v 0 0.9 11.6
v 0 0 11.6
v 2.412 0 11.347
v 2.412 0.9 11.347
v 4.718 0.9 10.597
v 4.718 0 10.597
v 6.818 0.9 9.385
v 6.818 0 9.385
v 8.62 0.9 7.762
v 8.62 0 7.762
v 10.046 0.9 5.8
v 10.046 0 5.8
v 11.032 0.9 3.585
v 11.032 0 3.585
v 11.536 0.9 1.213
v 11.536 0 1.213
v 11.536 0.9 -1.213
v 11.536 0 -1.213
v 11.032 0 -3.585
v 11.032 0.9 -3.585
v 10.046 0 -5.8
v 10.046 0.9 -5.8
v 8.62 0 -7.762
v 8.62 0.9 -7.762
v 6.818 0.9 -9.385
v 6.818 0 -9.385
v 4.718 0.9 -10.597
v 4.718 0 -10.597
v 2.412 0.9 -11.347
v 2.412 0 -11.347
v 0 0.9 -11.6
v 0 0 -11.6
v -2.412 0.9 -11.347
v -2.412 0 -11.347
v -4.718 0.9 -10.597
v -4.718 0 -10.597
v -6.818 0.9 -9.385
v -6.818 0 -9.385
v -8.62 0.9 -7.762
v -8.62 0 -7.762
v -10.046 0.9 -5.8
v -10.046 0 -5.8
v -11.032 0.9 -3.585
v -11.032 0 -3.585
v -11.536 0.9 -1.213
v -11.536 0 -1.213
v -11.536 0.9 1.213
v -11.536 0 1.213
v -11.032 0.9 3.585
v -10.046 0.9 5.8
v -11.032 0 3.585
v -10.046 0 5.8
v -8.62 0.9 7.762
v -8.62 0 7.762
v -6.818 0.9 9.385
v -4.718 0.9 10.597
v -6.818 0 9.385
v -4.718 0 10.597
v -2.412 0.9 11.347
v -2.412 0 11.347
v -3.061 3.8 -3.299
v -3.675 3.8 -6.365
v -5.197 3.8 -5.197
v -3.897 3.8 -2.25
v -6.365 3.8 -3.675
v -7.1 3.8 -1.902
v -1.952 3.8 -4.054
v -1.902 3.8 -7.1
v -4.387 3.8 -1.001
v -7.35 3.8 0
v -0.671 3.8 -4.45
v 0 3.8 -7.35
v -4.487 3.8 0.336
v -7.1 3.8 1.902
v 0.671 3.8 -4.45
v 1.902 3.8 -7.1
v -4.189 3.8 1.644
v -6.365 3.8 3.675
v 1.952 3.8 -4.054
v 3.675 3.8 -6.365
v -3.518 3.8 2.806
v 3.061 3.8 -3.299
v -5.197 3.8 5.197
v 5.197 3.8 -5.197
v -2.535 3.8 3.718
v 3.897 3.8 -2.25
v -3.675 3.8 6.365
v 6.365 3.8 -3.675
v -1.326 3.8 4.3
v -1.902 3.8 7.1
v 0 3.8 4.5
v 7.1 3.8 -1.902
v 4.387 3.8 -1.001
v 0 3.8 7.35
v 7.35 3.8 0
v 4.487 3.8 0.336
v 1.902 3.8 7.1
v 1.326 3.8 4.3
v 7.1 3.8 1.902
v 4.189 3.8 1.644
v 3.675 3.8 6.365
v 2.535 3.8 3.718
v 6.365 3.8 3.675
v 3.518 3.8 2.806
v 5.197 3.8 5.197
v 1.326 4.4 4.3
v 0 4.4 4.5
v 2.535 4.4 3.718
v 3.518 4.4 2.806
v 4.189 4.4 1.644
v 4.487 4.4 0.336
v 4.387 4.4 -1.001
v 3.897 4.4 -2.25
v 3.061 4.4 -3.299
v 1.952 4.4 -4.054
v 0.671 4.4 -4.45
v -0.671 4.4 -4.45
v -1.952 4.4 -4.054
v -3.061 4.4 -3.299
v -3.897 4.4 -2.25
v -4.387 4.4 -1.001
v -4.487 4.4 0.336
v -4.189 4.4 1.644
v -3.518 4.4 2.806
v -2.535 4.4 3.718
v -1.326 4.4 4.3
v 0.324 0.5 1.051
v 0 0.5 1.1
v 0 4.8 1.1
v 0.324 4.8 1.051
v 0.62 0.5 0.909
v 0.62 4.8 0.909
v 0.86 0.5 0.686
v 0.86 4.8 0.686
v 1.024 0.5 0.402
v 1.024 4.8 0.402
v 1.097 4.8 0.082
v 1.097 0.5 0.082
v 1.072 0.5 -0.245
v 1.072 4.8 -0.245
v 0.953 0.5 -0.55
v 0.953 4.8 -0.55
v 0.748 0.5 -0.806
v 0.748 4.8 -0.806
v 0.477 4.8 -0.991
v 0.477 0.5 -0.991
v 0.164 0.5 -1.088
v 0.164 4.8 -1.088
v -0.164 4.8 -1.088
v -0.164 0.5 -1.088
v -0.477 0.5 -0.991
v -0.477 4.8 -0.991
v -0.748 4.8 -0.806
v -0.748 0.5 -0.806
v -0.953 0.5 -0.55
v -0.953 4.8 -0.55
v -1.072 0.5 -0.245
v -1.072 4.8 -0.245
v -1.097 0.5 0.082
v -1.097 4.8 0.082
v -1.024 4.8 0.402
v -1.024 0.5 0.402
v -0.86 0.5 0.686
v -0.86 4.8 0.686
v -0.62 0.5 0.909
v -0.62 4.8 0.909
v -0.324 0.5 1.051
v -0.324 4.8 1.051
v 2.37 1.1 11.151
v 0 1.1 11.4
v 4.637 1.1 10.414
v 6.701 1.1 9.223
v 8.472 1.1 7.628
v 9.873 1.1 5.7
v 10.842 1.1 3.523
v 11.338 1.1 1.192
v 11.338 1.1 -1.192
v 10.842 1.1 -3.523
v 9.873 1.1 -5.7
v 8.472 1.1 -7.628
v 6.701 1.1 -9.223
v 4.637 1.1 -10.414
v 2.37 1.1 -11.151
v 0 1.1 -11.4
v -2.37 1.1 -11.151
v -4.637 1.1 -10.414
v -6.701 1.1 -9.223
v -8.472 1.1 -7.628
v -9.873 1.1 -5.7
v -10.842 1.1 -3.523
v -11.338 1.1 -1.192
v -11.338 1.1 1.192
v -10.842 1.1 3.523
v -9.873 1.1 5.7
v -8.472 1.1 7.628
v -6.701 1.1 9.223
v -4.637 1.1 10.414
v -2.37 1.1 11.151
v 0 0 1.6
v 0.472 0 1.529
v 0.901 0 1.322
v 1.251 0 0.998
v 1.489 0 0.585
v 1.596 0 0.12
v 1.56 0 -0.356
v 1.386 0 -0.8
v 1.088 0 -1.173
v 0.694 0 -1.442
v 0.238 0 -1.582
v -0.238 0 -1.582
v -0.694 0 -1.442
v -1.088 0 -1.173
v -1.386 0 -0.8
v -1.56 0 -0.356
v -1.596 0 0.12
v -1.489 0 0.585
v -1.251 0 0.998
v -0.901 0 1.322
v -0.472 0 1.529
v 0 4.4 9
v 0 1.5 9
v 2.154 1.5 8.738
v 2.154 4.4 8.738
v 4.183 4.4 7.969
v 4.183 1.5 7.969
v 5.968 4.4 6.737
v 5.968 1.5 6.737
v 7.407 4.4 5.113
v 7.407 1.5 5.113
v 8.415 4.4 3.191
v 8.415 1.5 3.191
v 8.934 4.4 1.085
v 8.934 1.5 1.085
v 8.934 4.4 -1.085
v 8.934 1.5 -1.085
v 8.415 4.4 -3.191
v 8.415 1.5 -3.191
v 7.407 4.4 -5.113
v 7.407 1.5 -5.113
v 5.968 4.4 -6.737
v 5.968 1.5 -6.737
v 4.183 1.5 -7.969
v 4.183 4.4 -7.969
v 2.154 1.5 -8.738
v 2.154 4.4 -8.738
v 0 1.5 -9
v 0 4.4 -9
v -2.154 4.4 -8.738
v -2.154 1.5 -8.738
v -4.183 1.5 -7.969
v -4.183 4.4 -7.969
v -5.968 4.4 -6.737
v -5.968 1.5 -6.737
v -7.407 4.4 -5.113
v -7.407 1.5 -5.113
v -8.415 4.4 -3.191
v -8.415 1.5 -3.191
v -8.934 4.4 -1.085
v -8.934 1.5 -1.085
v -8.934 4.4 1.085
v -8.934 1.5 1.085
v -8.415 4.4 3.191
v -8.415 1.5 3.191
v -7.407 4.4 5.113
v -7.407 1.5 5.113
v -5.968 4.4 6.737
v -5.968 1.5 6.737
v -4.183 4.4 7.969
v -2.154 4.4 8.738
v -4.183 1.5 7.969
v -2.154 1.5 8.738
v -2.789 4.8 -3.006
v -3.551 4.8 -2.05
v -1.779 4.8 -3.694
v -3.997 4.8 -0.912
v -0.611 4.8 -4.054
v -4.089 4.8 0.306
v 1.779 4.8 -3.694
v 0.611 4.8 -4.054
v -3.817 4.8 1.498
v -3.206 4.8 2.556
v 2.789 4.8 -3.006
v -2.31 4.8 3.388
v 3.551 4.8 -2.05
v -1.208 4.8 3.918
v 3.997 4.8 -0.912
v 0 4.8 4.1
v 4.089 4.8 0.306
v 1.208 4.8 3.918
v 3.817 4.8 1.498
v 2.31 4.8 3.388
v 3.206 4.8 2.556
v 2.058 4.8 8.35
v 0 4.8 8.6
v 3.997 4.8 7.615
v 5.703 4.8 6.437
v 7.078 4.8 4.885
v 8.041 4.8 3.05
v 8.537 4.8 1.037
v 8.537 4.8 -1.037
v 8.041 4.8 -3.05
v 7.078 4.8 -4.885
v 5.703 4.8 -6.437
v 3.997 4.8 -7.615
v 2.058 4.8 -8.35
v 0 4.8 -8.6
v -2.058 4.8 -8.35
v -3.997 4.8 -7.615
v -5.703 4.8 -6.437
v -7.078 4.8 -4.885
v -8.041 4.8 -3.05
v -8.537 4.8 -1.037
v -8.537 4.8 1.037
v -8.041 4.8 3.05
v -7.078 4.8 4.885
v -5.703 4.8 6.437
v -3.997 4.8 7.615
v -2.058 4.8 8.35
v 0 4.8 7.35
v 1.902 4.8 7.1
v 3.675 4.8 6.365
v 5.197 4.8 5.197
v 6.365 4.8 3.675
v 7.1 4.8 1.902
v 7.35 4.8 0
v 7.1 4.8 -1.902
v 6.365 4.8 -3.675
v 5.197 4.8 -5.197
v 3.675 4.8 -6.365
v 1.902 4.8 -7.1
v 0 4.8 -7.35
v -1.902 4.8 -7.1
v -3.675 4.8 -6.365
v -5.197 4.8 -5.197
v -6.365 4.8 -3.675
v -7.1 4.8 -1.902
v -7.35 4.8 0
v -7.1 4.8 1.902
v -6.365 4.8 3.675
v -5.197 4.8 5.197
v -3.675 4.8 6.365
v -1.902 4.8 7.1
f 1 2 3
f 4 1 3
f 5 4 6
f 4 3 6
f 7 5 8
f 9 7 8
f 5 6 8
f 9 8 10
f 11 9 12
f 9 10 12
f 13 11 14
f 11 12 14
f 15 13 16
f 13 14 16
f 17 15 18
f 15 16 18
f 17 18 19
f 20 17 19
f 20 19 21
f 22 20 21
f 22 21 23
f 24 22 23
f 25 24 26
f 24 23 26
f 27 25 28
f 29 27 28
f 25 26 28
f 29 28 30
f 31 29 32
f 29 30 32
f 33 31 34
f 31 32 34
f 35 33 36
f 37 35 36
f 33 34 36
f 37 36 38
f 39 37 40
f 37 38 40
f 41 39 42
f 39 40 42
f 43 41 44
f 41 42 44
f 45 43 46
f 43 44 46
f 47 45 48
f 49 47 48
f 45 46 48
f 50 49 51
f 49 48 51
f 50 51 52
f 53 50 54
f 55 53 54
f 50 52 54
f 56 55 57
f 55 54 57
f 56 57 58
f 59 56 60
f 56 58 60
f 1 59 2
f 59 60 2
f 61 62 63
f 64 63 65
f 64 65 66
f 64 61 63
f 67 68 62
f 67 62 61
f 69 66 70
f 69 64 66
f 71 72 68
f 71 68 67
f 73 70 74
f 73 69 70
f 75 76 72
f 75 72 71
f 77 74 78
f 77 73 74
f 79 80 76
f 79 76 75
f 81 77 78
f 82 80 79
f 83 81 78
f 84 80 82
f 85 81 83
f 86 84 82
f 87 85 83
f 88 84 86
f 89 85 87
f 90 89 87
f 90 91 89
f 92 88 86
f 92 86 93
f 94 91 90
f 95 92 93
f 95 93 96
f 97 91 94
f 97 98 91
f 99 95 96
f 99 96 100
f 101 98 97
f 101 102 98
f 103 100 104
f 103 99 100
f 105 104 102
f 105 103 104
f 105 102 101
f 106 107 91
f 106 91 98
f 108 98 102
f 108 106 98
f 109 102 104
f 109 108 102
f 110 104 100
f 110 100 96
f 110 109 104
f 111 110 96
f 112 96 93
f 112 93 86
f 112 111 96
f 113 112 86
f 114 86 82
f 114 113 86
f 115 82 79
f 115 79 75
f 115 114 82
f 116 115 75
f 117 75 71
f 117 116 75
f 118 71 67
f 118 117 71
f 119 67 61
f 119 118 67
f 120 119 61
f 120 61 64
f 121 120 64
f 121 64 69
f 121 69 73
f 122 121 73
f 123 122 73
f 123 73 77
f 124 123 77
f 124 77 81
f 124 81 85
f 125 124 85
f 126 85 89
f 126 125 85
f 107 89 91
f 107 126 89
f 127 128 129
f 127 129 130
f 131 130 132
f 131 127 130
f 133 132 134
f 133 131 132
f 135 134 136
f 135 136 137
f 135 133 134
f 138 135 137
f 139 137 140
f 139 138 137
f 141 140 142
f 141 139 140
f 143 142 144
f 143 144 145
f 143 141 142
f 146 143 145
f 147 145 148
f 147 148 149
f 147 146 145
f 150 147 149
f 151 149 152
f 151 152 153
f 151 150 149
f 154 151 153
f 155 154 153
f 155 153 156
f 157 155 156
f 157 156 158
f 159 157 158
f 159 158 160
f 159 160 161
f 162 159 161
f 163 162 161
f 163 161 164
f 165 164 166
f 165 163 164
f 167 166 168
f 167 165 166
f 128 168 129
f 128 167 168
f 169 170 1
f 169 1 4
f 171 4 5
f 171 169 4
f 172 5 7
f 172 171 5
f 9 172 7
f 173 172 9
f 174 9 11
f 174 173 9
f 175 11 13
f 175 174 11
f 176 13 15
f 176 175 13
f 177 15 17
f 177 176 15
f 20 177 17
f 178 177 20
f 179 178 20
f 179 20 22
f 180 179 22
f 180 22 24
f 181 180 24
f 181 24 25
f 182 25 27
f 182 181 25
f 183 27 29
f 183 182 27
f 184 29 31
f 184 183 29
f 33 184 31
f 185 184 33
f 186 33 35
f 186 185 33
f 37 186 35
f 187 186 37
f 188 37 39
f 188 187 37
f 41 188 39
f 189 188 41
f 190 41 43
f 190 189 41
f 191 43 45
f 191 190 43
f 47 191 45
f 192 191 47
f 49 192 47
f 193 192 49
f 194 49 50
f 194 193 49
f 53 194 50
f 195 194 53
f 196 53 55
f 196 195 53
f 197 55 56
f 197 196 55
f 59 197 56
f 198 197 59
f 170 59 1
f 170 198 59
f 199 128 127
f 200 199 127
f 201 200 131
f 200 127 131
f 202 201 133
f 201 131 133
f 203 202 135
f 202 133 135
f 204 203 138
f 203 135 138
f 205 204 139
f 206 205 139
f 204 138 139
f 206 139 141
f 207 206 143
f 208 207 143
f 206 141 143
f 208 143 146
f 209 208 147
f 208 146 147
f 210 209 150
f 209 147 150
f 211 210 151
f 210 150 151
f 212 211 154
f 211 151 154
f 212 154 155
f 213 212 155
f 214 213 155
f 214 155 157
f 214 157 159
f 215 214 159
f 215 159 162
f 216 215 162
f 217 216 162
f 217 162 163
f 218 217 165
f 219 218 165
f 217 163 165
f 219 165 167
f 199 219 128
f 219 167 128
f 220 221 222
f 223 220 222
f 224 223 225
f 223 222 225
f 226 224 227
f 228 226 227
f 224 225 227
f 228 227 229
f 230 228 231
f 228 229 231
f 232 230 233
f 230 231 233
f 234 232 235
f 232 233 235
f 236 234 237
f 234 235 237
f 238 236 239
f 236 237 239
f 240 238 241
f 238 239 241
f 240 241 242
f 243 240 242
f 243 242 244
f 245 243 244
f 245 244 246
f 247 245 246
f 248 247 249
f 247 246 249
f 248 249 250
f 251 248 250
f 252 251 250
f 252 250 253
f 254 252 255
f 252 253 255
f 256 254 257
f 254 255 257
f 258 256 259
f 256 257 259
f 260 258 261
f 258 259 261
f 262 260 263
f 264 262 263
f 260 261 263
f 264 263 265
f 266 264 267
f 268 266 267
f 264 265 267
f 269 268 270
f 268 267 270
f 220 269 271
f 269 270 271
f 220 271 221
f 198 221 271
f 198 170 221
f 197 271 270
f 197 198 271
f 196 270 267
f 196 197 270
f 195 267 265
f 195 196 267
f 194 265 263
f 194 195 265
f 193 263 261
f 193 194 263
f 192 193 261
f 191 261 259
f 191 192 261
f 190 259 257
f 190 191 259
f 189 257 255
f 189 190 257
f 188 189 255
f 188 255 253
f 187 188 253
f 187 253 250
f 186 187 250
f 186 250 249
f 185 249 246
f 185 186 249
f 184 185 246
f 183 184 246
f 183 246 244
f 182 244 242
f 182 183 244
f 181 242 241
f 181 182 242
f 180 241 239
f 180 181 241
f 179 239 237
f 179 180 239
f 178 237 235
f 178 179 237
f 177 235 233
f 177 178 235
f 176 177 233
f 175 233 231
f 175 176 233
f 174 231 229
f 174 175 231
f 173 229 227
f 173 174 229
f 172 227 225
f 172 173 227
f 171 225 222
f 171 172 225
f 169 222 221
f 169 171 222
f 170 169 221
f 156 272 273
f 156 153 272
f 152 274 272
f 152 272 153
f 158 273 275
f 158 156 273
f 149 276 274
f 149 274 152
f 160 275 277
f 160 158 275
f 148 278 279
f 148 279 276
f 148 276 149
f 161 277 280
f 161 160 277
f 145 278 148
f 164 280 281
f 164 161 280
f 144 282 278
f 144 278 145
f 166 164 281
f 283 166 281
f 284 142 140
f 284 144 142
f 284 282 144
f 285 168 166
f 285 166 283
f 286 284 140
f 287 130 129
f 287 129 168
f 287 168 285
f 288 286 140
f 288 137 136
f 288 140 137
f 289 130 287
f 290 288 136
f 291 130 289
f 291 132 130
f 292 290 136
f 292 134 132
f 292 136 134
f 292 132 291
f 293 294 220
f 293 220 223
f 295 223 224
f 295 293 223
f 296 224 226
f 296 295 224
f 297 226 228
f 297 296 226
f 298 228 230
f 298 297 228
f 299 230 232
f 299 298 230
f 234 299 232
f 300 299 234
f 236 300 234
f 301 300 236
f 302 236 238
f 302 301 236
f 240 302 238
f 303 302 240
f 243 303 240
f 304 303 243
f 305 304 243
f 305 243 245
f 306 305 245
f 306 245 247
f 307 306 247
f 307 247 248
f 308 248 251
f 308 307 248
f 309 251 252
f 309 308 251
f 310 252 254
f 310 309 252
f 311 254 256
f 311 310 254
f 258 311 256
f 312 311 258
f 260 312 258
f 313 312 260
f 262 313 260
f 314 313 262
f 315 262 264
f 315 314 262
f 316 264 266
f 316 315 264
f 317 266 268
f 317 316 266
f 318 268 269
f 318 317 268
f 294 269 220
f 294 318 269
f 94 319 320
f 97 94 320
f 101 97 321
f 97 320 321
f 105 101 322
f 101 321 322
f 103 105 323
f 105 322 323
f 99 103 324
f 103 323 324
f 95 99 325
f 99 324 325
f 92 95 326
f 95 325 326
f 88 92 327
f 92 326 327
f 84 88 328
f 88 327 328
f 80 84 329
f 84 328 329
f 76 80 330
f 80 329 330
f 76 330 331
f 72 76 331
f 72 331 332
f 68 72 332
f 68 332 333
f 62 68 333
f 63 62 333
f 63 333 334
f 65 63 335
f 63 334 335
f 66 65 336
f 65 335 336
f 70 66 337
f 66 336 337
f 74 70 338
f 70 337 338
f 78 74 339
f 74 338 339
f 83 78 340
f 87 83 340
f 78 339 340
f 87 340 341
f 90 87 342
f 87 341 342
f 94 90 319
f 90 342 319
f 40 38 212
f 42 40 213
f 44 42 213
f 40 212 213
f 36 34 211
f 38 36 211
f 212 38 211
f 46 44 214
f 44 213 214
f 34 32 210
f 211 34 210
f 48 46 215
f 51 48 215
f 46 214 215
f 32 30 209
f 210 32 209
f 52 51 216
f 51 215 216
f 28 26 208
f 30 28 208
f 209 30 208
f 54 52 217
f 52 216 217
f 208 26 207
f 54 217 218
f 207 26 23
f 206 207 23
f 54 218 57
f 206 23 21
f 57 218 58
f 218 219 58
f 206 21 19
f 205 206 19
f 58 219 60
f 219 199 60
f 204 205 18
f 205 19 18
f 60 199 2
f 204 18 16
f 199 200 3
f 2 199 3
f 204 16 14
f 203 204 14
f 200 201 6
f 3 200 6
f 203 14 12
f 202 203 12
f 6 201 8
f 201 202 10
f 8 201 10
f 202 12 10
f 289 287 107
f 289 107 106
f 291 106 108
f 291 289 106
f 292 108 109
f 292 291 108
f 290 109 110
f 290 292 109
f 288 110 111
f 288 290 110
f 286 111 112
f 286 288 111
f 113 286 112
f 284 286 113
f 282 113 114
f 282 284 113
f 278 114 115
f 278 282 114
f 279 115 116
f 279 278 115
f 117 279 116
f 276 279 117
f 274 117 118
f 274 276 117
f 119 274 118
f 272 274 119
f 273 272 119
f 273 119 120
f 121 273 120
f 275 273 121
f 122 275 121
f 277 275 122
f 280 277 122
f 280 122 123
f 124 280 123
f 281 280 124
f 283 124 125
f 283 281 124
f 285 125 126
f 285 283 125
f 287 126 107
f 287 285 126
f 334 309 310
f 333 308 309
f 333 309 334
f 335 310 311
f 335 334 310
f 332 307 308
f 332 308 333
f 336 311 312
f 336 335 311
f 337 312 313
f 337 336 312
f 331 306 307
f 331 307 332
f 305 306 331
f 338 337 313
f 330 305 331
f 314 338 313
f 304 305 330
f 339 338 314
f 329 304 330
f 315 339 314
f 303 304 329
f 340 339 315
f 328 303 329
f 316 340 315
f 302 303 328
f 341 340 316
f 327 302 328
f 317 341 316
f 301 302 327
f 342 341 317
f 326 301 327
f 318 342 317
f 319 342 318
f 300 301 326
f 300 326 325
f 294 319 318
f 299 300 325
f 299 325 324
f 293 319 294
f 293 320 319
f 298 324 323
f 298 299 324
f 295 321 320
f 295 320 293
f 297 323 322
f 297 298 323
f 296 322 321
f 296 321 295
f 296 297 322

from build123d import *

# Parameters (mm, degrees)
SKETCH_4_R          = 11.6
SKETCH_4_R_2        = 1.1
EXTRUDE_1_DEPTH     = 1.1
EXTRUDE_START       = 1.5
SKETCH_4_3_R        = 9
SKETCH_4_3_R_2      = 1.1
EXTRUDE_2_DEPTH     = 3.3
CHAMFER_1_SIZE      = 0.2
SKETCH_6_R          = 7.35
SKETCH_6_R_2        = 4.5
CUT_EXTRUDE_1_DEPTH = 1
CHAMFER_2_SIZE      = 0.4
SKETCH_4_4_R        = 1.1
CUT_EXTRUDE_2_DEPTH = 18.092688495
CHAMFER_3_SIZE      = 0.5


with BuildPart() as part:
    # 草图4 → 凸台-拉伸1 (new body)
    with BuildSketch(Plane(origin=(0, 0, 0), x_dir=(1, 0, 0), z_dir=(0, 1, 0))):
        Circle(SKETCH_4_R)
        Circle(SKETCH_4_R_2, mode=Mode.SUBTRACT)
    extrude(amount=EXTRUDE_1_DEPTH)

    # 倒角1
    chamfer_1_edges = [part.edges().sort_by_distance(p)[0] for p in [
        (-11.6, 1.1, 0),
    ]]
    chamfer(chamfer_1_edges, length=CHAMFER_1_SIZE)


with BuildPart() as body_2:
    # 草图4<3> → 凸台-拉伸2 (new body)
    with BuildSketch(Plane(origin=(0, 0, 0), x_dir=(1, 0, 0), z_dir=(0, 1, 0)).offset(EXTRUDE_START)):
        Circle(SKETCH_4_3_R)
        Circle(SKETCH_4_3_R_2, mode=Mode.SUBTRACT)
    extrude(amount=EXTRUDE_2_DEPTH)


    add(part.part)  # loft_1 joins it to this body
    # loft up to a face of the part (loft_1)
    loft([Face(Wire([body_2.edges().sort_by_distance((-6.160923953, 1.5, 6.560717647))[0]])), Face(Wire([body_2.edges().sort_by_distance((-7.803837008, 1.1, -8.310242353))[0]]))])

    # 草图6 → 切除-拉伸1 (cut)
    with BuildSketch(Plane(origin=(0, 4.8, 0), x_dir=(1, 0, 0), z_dir=(0, 1, 0))):
        Circle(SKETCH_6_R)
        Circle(SKETCH_6_R_2, mode=Mode.SUBTRACT)
    extrude(amount=-CUT_EXTRUDE_1_DEPTH, mode=Mode.SUBTRACT)

    # 倒角2
    chamfer_2_edges = [body_2.edges().sort_by_distance(p)[0] for p in [
        (-4.5, 4.8, 0),
        (-9, 4.8, 0),
    ]]
    chamfer(chamfer_2_edges, length=CHAMFER_2_SIZE)

    # 草图4<4> → 切除-拉伸2 (cut, through all)
    with BuildSketch(Plane(origin=(0, 0, 0), x_dir=(1, 0, 0), z_dir=(0, 1, 0))):
        Circle(SKETCH_4_4_R)
    extrude(amount=CUT_EXTRUDE_2_DEPTH, mode=Mode.SUBTRACT)

    # 倒角3
    chamfer_3_edges = [body_2.edges().sort_by_distance(p)[0] for p in [
        (-1.1, 0, 0),
    ]]
    chamfer(chamfer_3_edges, length=CHAMFER_3_SIZE)


solid = body_2.part
